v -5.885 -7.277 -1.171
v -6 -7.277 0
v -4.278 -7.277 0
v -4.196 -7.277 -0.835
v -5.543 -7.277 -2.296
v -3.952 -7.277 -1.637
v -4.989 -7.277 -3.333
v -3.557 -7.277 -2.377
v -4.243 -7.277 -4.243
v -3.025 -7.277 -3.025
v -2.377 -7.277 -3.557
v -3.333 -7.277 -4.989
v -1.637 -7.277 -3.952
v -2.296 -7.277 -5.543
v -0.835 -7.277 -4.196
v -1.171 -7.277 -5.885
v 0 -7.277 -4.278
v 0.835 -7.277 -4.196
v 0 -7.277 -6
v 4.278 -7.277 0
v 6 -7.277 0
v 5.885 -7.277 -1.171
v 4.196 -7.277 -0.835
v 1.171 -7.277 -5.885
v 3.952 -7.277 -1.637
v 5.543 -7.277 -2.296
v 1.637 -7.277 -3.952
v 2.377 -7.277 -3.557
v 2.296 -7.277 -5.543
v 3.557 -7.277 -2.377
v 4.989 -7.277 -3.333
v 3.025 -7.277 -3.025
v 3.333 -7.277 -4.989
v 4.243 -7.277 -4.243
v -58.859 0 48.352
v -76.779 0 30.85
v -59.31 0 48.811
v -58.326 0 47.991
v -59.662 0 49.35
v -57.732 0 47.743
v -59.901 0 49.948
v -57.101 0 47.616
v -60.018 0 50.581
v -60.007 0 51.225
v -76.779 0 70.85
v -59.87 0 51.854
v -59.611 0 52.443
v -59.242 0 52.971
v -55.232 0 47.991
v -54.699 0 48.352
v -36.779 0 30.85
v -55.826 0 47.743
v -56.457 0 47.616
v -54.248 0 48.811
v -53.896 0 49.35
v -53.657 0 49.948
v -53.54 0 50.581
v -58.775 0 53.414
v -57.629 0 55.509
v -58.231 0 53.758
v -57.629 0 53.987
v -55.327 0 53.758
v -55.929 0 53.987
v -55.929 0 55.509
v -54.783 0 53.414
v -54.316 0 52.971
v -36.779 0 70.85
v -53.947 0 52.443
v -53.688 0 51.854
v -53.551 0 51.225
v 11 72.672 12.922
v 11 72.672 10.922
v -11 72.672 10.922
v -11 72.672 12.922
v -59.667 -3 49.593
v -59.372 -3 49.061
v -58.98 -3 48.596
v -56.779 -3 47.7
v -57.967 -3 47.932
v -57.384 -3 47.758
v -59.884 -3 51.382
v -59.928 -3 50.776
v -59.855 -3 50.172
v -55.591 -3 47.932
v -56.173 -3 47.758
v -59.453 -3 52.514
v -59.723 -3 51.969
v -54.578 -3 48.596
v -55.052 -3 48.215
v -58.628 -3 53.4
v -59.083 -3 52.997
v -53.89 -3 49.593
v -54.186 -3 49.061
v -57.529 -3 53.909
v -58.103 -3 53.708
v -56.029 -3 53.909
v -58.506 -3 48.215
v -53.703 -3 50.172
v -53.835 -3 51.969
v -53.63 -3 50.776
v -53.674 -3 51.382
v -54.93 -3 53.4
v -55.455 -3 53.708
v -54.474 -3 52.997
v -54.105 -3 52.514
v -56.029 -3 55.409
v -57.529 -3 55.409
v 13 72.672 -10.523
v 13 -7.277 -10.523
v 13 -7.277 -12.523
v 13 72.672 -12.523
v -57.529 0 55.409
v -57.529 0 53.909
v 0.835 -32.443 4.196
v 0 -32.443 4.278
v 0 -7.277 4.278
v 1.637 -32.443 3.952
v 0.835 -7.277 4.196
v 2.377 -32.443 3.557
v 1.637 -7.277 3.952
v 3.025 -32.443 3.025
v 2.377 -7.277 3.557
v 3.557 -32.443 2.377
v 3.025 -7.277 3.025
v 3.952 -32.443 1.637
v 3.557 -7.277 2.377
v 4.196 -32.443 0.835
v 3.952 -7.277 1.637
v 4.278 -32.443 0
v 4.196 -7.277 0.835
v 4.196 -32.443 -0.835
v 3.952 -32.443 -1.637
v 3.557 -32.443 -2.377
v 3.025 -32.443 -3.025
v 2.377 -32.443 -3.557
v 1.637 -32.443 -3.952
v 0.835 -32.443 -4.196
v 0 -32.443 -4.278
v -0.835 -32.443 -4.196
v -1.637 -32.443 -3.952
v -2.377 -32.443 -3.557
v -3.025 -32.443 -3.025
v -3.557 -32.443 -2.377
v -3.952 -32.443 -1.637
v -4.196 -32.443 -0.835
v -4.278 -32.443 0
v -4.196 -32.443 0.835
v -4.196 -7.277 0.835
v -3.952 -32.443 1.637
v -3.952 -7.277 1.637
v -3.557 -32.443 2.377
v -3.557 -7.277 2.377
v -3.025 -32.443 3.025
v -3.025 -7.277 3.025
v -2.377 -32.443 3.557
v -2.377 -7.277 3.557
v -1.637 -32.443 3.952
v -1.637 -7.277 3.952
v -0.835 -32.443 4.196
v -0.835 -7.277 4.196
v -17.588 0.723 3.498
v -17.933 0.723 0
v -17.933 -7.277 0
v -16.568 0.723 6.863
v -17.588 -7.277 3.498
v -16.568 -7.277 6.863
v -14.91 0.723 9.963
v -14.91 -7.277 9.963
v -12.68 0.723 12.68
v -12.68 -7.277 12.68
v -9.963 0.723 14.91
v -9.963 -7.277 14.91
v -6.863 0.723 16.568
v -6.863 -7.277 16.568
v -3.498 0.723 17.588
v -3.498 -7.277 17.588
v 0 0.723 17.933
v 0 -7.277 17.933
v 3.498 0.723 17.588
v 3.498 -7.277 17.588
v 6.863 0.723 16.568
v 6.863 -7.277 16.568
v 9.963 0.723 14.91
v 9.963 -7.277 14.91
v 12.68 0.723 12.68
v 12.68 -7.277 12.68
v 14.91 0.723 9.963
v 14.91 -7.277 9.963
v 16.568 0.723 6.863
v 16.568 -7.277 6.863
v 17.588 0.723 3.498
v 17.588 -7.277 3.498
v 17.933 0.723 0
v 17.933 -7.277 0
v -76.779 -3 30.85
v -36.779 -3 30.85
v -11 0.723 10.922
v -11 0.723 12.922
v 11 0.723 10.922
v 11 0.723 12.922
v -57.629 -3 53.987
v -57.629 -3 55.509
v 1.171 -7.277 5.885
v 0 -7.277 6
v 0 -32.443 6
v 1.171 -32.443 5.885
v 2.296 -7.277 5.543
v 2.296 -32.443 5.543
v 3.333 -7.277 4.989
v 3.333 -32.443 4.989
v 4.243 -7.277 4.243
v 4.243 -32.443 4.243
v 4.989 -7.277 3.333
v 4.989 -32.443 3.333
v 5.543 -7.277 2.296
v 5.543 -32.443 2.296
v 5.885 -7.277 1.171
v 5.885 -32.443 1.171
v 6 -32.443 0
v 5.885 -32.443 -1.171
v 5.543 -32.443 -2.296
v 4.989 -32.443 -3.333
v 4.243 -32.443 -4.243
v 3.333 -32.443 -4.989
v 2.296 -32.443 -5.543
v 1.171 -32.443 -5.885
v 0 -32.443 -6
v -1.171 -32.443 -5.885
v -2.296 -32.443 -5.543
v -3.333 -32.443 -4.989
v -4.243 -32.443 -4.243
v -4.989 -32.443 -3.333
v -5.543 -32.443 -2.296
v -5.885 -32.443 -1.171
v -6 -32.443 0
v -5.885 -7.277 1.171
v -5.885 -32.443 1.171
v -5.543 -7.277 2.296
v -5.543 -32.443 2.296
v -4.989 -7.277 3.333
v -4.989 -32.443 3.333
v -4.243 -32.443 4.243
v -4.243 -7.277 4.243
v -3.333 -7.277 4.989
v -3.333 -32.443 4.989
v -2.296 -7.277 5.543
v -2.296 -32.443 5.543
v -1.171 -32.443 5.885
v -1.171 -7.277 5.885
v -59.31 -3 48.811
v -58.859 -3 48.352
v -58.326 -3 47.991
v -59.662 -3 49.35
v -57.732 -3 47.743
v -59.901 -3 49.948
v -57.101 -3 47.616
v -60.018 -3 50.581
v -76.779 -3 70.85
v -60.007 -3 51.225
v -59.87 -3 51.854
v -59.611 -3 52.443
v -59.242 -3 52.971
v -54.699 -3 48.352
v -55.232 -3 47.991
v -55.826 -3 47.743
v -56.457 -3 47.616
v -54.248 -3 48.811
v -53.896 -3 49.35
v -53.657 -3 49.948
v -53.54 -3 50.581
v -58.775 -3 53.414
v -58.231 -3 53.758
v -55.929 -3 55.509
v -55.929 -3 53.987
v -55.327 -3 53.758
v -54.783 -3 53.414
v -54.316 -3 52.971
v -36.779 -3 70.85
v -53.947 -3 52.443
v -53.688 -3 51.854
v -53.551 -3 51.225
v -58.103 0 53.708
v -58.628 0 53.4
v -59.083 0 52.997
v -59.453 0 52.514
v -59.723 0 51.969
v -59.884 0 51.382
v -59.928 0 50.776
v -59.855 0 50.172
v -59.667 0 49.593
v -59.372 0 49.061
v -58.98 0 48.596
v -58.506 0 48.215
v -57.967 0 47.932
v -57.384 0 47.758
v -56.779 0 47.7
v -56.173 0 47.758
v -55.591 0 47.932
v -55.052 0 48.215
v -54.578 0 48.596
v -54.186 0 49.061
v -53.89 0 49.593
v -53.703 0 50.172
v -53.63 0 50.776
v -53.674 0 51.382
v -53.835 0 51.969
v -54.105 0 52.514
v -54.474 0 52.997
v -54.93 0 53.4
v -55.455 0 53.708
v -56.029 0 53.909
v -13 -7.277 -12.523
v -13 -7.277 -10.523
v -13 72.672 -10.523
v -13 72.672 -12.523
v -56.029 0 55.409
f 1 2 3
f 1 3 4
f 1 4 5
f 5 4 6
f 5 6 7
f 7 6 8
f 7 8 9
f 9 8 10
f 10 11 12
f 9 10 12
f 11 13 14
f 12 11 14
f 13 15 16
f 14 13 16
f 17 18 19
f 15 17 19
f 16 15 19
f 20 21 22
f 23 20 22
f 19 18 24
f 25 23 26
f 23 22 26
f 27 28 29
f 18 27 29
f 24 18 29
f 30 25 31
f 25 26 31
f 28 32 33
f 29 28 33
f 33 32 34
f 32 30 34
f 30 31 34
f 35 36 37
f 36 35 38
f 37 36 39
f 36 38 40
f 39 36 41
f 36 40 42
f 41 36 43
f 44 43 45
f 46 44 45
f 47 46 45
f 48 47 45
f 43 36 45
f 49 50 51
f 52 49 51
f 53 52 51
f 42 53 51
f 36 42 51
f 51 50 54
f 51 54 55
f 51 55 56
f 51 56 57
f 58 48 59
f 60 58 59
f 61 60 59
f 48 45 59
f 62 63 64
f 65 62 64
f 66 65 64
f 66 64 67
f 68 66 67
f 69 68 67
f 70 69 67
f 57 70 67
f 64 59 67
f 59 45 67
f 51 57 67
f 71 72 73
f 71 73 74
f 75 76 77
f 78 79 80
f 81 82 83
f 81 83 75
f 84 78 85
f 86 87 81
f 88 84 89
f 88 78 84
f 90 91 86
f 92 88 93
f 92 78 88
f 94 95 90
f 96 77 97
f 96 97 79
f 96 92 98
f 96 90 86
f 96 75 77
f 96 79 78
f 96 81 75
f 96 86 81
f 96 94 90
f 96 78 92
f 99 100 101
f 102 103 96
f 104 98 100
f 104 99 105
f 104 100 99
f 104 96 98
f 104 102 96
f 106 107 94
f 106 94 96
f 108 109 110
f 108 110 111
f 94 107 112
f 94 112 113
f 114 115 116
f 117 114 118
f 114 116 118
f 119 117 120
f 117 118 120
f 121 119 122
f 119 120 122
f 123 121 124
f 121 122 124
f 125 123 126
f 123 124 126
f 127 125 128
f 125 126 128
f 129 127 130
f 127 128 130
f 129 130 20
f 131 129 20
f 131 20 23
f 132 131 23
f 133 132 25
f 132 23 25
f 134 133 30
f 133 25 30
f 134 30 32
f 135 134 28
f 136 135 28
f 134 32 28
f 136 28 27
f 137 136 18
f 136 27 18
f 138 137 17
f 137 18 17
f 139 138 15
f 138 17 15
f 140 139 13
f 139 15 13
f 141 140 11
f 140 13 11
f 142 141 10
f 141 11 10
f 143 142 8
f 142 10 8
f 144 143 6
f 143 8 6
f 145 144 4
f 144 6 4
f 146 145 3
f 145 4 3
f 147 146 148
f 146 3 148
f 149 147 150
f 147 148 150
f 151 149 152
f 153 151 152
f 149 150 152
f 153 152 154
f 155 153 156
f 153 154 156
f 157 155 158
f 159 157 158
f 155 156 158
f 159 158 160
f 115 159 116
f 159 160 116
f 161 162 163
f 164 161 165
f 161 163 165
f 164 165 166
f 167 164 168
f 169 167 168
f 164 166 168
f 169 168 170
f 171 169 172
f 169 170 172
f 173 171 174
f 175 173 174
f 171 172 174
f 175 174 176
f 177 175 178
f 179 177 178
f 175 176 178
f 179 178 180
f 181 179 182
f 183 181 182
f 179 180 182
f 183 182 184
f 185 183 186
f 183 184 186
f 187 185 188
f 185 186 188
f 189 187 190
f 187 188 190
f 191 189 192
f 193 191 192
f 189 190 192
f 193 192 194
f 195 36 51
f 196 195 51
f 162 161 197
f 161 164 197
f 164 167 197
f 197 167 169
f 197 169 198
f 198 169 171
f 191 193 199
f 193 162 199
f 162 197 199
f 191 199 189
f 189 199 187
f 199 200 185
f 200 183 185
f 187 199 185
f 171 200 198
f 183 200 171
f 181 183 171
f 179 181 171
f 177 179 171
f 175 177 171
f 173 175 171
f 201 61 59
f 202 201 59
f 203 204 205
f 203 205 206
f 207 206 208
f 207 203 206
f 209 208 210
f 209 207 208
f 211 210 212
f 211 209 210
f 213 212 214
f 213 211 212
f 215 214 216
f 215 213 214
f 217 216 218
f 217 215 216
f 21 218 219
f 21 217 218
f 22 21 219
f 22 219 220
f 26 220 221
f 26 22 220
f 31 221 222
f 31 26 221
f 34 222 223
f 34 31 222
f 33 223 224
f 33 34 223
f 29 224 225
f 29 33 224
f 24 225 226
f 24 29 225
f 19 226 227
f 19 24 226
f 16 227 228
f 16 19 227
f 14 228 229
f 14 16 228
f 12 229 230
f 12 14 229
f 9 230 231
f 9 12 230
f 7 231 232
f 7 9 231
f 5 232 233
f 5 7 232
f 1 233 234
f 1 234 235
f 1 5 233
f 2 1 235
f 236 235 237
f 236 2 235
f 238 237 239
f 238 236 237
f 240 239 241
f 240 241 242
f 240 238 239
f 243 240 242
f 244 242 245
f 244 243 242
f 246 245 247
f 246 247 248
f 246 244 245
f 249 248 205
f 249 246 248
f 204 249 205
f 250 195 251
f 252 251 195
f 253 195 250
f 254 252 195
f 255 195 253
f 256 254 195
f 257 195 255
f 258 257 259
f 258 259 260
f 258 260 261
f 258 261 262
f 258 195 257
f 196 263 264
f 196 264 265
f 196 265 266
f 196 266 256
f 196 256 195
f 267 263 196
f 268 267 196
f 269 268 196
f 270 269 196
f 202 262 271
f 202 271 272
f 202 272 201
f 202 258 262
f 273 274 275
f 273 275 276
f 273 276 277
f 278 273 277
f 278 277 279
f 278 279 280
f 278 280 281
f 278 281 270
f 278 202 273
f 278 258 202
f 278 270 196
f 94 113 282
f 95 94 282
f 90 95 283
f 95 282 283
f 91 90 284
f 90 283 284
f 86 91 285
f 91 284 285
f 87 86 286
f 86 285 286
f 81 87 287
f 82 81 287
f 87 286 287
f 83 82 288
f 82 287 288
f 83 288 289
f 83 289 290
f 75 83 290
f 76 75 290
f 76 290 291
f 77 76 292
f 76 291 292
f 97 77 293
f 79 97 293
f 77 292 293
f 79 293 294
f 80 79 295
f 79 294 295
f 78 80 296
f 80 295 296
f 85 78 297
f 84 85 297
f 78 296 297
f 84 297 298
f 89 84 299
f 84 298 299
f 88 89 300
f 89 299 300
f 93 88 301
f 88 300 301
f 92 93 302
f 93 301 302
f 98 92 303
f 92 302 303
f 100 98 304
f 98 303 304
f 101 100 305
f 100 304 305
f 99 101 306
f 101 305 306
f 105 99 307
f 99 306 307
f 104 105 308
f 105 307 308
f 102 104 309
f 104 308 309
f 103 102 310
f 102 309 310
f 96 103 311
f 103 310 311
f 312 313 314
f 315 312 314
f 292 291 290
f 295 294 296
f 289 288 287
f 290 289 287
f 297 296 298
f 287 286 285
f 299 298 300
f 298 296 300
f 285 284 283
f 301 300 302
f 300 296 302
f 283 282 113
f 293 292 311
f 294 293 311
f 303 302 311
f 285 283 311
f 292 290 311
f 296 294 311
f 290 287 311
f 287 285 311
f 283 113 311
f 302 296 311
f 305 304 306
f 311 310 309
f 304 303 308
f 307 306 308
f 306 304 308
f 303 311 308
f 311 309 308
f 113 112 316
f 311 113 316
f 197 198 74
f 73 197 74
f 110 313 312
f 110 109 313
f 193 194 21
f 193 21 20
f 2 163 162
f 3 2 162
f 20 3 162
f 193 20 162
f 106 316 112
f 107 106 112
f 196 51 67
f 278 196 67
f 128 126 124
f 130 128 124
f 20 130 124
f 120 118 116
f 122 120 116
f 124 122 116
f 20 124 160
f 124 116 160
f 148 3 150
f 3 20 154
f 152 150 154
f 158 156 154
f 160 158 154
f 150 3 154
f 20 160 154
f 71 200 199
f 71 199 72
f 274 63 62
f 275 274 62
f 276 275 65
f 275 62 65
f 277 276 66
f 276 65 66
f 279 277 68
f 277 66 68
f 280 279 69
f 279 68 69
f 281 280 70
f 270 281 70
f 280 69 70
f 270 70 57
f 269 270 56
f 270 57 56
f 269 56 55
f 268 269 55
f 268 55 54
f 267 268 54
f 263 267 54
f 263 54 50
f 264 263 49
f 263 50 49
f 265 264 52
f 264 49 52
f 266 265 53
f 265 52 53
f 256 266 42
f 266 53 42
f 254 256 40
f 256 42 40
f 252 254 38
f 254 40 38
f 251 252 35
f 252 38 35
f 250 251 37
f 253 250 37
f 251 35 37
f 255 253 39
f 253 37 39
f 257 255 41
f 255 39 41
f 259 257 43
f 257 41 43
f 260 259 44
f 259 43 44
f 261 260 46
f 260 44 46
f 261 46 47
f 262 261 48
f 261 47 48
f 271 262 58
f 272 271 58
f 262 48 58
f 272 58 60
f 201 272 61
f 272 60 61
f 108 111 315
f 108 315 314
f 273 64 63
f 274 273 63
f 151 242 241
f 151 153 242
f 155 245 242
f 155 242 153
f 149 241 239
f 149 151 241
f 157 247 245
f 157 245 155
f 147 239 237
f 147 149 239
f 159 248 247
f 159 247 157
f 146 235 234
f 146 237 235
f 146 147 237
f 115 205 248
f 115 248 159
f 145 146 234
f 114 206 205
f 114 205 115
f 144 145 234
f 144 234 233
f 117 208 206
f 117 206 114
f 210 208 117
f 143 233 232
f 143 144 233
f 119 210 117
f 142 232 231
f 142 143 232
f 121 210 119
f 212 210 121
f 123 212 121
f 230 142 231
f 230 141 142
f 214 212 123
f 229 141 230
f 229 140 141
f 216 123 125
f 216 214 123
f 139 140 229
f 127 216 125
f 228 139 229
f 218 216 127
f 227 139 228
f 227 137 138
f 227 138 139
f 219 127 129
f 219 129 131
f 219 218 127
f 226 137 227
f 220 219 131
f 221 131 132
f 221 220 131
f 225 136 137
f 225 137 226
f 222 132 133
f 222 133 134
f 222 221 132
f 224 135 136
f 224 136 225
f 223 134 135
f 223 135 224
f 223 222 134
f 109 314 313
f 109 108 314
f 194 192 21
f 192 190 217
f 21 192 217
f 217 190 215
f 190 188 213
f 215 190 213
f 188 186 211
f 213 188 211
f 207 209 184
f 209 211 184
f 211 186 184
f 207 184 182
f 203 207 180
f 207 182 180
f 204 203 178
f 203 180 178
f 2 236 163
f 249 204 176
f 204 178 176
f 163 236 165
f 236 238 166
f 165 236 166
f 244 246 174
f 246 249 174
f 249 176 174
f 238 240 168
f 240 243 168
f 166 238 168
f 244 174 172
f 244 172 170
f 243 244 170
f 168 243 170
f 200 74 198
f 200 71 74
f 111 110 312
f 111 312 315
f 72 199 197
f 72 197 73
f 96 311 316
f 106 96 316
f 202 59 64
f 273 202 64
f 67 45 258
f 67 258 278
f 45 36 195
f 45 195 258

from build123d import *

# Parameters (mm, degrees)
F0_W          = 25.1666777024
F0_H          = 1.7222229476
F2_ANGLE_BACK = 90
F2_ANGLE      = 180
F3_DEPTH      = 13
F4_DEPTH      = 11
F5_W          = 40
F5_H          = 40
F6_DEPTH      = 3


with BuildPart() as f1:
    # F0 (on Right) → F1 (revolve)
    with BuildSketch(Plane.YZ):
        with Locations((-19.8599786063, 5.1388885262)):
            Rectangle(F0_W, F0_H)
    revolve(axis=Axis((0, 11.4922590109, 0), (0, 1, 0)))

    # F0 (on Right) → F2 (revolve)
    with BuildSketch(Plane.YZ, mode=Mode.PRIVATE) as f2_sk:
        Polygon((-7.2766397551, 6), (-7.2766397551, 4.2777770524), (-7.2766397551, 0), (0.7233642667, 0), (0.7233642667, 10.9218580239), (0.7233642667, 12.9218580239), (0.7233642667, 17.9325940357), (-7.2766397551, 17.9325940357), align=None)
    revolve(f2_sk.sketch.rotate(Axis((0, 11.4922590109, 0), (0, 1, 0)), -F2_ANGLE_BACK), axis=Axis((0, 11.4922590109, 0), (0, 1, 0)), revolution_arc=F2_ANGLE)

    # F0 (on Right) → F4 (join, symmetric)
    with BuildSketch(Plane.YZ):
        Polygon((0.7233642667, 12.9218580239), (0.7233642667, 10.9218580239), (10.225285776, 10.9218580239), (65.0394260883, 10.9218580239), (72.6717057781, 10.9218580239), (72.6717057781, 12.9218580239), align=None)
    extrude(amount=F4_DEPTH, both=True)


with BuildPart() as f3:
    # F0 (on Right) → F3 (new body, symmetric)
    with BuildSketch(Plane.YZ):
        Polygon((0.7233642667, -10.5227902532), (-7.2766397551, -10.5227902532), (-7.2766397551, -12.5227902532), (72.6717057781, -12.5227902532), (72.6717057781, -10.5227902532), (65.0394260883, -10.5227902532), (10.225285776, -10.5227902532), align=None)
    extrude(amount=F3_DEPTH, both=True)


with BuildPart() as f6:
    # F5 (on Front) → F6 (new body)
    with BuildSketch(Plane.XZ):
        with Locations((-56.7789445817, 50.8497212827)):
            Rectangle(F5_W, F5_H)
        with BuildLine():
            ThreePointArc((-55.9289445817, 53.986598711), (-56.7789445817, 47.5997212827), (-57.6289445817, 53.986598711))
            Line((-57.6289445817, 53.986598711), (-57.6289445817, 55.5091329909))
            Line((-57.6289445817, 55.5091329909), (-55.9289445817, 55.5091329909))
            Line((-55.9289445817, 55.5091329909), (-55.9289445817, 53.986598711))
        make_face(mode=Mode.SUBTRACT)
    extrude(amount=F6_DEPTH)


with BuildPart() as f6b:
    # F5 (on Front) → F6, piece 2 (new body)
    with BuildSketch(Plane.XZ):
        with BuildLine():
            Line((-57.5289445817, 55.4091329909), (-57.5289445817, 53.9091329909))
            ThreePointArc((-57.5289445817, 53.9091329909), (-56.7789445817, 47.6997212827), (-56.0289445817, 53.9091329909))
            Line((-56.0289445817, 53.9091329909), (-56.0289445817, 55.4091329909))
            Line((-56.0289445817, 55.4091329909), (-57.5289445817, 55.4091329909))
        make_face()
    extrude(amount=F6_DEPTH)


solid = Compound([f1.part, f3.part, f6.part, f6b.part])
